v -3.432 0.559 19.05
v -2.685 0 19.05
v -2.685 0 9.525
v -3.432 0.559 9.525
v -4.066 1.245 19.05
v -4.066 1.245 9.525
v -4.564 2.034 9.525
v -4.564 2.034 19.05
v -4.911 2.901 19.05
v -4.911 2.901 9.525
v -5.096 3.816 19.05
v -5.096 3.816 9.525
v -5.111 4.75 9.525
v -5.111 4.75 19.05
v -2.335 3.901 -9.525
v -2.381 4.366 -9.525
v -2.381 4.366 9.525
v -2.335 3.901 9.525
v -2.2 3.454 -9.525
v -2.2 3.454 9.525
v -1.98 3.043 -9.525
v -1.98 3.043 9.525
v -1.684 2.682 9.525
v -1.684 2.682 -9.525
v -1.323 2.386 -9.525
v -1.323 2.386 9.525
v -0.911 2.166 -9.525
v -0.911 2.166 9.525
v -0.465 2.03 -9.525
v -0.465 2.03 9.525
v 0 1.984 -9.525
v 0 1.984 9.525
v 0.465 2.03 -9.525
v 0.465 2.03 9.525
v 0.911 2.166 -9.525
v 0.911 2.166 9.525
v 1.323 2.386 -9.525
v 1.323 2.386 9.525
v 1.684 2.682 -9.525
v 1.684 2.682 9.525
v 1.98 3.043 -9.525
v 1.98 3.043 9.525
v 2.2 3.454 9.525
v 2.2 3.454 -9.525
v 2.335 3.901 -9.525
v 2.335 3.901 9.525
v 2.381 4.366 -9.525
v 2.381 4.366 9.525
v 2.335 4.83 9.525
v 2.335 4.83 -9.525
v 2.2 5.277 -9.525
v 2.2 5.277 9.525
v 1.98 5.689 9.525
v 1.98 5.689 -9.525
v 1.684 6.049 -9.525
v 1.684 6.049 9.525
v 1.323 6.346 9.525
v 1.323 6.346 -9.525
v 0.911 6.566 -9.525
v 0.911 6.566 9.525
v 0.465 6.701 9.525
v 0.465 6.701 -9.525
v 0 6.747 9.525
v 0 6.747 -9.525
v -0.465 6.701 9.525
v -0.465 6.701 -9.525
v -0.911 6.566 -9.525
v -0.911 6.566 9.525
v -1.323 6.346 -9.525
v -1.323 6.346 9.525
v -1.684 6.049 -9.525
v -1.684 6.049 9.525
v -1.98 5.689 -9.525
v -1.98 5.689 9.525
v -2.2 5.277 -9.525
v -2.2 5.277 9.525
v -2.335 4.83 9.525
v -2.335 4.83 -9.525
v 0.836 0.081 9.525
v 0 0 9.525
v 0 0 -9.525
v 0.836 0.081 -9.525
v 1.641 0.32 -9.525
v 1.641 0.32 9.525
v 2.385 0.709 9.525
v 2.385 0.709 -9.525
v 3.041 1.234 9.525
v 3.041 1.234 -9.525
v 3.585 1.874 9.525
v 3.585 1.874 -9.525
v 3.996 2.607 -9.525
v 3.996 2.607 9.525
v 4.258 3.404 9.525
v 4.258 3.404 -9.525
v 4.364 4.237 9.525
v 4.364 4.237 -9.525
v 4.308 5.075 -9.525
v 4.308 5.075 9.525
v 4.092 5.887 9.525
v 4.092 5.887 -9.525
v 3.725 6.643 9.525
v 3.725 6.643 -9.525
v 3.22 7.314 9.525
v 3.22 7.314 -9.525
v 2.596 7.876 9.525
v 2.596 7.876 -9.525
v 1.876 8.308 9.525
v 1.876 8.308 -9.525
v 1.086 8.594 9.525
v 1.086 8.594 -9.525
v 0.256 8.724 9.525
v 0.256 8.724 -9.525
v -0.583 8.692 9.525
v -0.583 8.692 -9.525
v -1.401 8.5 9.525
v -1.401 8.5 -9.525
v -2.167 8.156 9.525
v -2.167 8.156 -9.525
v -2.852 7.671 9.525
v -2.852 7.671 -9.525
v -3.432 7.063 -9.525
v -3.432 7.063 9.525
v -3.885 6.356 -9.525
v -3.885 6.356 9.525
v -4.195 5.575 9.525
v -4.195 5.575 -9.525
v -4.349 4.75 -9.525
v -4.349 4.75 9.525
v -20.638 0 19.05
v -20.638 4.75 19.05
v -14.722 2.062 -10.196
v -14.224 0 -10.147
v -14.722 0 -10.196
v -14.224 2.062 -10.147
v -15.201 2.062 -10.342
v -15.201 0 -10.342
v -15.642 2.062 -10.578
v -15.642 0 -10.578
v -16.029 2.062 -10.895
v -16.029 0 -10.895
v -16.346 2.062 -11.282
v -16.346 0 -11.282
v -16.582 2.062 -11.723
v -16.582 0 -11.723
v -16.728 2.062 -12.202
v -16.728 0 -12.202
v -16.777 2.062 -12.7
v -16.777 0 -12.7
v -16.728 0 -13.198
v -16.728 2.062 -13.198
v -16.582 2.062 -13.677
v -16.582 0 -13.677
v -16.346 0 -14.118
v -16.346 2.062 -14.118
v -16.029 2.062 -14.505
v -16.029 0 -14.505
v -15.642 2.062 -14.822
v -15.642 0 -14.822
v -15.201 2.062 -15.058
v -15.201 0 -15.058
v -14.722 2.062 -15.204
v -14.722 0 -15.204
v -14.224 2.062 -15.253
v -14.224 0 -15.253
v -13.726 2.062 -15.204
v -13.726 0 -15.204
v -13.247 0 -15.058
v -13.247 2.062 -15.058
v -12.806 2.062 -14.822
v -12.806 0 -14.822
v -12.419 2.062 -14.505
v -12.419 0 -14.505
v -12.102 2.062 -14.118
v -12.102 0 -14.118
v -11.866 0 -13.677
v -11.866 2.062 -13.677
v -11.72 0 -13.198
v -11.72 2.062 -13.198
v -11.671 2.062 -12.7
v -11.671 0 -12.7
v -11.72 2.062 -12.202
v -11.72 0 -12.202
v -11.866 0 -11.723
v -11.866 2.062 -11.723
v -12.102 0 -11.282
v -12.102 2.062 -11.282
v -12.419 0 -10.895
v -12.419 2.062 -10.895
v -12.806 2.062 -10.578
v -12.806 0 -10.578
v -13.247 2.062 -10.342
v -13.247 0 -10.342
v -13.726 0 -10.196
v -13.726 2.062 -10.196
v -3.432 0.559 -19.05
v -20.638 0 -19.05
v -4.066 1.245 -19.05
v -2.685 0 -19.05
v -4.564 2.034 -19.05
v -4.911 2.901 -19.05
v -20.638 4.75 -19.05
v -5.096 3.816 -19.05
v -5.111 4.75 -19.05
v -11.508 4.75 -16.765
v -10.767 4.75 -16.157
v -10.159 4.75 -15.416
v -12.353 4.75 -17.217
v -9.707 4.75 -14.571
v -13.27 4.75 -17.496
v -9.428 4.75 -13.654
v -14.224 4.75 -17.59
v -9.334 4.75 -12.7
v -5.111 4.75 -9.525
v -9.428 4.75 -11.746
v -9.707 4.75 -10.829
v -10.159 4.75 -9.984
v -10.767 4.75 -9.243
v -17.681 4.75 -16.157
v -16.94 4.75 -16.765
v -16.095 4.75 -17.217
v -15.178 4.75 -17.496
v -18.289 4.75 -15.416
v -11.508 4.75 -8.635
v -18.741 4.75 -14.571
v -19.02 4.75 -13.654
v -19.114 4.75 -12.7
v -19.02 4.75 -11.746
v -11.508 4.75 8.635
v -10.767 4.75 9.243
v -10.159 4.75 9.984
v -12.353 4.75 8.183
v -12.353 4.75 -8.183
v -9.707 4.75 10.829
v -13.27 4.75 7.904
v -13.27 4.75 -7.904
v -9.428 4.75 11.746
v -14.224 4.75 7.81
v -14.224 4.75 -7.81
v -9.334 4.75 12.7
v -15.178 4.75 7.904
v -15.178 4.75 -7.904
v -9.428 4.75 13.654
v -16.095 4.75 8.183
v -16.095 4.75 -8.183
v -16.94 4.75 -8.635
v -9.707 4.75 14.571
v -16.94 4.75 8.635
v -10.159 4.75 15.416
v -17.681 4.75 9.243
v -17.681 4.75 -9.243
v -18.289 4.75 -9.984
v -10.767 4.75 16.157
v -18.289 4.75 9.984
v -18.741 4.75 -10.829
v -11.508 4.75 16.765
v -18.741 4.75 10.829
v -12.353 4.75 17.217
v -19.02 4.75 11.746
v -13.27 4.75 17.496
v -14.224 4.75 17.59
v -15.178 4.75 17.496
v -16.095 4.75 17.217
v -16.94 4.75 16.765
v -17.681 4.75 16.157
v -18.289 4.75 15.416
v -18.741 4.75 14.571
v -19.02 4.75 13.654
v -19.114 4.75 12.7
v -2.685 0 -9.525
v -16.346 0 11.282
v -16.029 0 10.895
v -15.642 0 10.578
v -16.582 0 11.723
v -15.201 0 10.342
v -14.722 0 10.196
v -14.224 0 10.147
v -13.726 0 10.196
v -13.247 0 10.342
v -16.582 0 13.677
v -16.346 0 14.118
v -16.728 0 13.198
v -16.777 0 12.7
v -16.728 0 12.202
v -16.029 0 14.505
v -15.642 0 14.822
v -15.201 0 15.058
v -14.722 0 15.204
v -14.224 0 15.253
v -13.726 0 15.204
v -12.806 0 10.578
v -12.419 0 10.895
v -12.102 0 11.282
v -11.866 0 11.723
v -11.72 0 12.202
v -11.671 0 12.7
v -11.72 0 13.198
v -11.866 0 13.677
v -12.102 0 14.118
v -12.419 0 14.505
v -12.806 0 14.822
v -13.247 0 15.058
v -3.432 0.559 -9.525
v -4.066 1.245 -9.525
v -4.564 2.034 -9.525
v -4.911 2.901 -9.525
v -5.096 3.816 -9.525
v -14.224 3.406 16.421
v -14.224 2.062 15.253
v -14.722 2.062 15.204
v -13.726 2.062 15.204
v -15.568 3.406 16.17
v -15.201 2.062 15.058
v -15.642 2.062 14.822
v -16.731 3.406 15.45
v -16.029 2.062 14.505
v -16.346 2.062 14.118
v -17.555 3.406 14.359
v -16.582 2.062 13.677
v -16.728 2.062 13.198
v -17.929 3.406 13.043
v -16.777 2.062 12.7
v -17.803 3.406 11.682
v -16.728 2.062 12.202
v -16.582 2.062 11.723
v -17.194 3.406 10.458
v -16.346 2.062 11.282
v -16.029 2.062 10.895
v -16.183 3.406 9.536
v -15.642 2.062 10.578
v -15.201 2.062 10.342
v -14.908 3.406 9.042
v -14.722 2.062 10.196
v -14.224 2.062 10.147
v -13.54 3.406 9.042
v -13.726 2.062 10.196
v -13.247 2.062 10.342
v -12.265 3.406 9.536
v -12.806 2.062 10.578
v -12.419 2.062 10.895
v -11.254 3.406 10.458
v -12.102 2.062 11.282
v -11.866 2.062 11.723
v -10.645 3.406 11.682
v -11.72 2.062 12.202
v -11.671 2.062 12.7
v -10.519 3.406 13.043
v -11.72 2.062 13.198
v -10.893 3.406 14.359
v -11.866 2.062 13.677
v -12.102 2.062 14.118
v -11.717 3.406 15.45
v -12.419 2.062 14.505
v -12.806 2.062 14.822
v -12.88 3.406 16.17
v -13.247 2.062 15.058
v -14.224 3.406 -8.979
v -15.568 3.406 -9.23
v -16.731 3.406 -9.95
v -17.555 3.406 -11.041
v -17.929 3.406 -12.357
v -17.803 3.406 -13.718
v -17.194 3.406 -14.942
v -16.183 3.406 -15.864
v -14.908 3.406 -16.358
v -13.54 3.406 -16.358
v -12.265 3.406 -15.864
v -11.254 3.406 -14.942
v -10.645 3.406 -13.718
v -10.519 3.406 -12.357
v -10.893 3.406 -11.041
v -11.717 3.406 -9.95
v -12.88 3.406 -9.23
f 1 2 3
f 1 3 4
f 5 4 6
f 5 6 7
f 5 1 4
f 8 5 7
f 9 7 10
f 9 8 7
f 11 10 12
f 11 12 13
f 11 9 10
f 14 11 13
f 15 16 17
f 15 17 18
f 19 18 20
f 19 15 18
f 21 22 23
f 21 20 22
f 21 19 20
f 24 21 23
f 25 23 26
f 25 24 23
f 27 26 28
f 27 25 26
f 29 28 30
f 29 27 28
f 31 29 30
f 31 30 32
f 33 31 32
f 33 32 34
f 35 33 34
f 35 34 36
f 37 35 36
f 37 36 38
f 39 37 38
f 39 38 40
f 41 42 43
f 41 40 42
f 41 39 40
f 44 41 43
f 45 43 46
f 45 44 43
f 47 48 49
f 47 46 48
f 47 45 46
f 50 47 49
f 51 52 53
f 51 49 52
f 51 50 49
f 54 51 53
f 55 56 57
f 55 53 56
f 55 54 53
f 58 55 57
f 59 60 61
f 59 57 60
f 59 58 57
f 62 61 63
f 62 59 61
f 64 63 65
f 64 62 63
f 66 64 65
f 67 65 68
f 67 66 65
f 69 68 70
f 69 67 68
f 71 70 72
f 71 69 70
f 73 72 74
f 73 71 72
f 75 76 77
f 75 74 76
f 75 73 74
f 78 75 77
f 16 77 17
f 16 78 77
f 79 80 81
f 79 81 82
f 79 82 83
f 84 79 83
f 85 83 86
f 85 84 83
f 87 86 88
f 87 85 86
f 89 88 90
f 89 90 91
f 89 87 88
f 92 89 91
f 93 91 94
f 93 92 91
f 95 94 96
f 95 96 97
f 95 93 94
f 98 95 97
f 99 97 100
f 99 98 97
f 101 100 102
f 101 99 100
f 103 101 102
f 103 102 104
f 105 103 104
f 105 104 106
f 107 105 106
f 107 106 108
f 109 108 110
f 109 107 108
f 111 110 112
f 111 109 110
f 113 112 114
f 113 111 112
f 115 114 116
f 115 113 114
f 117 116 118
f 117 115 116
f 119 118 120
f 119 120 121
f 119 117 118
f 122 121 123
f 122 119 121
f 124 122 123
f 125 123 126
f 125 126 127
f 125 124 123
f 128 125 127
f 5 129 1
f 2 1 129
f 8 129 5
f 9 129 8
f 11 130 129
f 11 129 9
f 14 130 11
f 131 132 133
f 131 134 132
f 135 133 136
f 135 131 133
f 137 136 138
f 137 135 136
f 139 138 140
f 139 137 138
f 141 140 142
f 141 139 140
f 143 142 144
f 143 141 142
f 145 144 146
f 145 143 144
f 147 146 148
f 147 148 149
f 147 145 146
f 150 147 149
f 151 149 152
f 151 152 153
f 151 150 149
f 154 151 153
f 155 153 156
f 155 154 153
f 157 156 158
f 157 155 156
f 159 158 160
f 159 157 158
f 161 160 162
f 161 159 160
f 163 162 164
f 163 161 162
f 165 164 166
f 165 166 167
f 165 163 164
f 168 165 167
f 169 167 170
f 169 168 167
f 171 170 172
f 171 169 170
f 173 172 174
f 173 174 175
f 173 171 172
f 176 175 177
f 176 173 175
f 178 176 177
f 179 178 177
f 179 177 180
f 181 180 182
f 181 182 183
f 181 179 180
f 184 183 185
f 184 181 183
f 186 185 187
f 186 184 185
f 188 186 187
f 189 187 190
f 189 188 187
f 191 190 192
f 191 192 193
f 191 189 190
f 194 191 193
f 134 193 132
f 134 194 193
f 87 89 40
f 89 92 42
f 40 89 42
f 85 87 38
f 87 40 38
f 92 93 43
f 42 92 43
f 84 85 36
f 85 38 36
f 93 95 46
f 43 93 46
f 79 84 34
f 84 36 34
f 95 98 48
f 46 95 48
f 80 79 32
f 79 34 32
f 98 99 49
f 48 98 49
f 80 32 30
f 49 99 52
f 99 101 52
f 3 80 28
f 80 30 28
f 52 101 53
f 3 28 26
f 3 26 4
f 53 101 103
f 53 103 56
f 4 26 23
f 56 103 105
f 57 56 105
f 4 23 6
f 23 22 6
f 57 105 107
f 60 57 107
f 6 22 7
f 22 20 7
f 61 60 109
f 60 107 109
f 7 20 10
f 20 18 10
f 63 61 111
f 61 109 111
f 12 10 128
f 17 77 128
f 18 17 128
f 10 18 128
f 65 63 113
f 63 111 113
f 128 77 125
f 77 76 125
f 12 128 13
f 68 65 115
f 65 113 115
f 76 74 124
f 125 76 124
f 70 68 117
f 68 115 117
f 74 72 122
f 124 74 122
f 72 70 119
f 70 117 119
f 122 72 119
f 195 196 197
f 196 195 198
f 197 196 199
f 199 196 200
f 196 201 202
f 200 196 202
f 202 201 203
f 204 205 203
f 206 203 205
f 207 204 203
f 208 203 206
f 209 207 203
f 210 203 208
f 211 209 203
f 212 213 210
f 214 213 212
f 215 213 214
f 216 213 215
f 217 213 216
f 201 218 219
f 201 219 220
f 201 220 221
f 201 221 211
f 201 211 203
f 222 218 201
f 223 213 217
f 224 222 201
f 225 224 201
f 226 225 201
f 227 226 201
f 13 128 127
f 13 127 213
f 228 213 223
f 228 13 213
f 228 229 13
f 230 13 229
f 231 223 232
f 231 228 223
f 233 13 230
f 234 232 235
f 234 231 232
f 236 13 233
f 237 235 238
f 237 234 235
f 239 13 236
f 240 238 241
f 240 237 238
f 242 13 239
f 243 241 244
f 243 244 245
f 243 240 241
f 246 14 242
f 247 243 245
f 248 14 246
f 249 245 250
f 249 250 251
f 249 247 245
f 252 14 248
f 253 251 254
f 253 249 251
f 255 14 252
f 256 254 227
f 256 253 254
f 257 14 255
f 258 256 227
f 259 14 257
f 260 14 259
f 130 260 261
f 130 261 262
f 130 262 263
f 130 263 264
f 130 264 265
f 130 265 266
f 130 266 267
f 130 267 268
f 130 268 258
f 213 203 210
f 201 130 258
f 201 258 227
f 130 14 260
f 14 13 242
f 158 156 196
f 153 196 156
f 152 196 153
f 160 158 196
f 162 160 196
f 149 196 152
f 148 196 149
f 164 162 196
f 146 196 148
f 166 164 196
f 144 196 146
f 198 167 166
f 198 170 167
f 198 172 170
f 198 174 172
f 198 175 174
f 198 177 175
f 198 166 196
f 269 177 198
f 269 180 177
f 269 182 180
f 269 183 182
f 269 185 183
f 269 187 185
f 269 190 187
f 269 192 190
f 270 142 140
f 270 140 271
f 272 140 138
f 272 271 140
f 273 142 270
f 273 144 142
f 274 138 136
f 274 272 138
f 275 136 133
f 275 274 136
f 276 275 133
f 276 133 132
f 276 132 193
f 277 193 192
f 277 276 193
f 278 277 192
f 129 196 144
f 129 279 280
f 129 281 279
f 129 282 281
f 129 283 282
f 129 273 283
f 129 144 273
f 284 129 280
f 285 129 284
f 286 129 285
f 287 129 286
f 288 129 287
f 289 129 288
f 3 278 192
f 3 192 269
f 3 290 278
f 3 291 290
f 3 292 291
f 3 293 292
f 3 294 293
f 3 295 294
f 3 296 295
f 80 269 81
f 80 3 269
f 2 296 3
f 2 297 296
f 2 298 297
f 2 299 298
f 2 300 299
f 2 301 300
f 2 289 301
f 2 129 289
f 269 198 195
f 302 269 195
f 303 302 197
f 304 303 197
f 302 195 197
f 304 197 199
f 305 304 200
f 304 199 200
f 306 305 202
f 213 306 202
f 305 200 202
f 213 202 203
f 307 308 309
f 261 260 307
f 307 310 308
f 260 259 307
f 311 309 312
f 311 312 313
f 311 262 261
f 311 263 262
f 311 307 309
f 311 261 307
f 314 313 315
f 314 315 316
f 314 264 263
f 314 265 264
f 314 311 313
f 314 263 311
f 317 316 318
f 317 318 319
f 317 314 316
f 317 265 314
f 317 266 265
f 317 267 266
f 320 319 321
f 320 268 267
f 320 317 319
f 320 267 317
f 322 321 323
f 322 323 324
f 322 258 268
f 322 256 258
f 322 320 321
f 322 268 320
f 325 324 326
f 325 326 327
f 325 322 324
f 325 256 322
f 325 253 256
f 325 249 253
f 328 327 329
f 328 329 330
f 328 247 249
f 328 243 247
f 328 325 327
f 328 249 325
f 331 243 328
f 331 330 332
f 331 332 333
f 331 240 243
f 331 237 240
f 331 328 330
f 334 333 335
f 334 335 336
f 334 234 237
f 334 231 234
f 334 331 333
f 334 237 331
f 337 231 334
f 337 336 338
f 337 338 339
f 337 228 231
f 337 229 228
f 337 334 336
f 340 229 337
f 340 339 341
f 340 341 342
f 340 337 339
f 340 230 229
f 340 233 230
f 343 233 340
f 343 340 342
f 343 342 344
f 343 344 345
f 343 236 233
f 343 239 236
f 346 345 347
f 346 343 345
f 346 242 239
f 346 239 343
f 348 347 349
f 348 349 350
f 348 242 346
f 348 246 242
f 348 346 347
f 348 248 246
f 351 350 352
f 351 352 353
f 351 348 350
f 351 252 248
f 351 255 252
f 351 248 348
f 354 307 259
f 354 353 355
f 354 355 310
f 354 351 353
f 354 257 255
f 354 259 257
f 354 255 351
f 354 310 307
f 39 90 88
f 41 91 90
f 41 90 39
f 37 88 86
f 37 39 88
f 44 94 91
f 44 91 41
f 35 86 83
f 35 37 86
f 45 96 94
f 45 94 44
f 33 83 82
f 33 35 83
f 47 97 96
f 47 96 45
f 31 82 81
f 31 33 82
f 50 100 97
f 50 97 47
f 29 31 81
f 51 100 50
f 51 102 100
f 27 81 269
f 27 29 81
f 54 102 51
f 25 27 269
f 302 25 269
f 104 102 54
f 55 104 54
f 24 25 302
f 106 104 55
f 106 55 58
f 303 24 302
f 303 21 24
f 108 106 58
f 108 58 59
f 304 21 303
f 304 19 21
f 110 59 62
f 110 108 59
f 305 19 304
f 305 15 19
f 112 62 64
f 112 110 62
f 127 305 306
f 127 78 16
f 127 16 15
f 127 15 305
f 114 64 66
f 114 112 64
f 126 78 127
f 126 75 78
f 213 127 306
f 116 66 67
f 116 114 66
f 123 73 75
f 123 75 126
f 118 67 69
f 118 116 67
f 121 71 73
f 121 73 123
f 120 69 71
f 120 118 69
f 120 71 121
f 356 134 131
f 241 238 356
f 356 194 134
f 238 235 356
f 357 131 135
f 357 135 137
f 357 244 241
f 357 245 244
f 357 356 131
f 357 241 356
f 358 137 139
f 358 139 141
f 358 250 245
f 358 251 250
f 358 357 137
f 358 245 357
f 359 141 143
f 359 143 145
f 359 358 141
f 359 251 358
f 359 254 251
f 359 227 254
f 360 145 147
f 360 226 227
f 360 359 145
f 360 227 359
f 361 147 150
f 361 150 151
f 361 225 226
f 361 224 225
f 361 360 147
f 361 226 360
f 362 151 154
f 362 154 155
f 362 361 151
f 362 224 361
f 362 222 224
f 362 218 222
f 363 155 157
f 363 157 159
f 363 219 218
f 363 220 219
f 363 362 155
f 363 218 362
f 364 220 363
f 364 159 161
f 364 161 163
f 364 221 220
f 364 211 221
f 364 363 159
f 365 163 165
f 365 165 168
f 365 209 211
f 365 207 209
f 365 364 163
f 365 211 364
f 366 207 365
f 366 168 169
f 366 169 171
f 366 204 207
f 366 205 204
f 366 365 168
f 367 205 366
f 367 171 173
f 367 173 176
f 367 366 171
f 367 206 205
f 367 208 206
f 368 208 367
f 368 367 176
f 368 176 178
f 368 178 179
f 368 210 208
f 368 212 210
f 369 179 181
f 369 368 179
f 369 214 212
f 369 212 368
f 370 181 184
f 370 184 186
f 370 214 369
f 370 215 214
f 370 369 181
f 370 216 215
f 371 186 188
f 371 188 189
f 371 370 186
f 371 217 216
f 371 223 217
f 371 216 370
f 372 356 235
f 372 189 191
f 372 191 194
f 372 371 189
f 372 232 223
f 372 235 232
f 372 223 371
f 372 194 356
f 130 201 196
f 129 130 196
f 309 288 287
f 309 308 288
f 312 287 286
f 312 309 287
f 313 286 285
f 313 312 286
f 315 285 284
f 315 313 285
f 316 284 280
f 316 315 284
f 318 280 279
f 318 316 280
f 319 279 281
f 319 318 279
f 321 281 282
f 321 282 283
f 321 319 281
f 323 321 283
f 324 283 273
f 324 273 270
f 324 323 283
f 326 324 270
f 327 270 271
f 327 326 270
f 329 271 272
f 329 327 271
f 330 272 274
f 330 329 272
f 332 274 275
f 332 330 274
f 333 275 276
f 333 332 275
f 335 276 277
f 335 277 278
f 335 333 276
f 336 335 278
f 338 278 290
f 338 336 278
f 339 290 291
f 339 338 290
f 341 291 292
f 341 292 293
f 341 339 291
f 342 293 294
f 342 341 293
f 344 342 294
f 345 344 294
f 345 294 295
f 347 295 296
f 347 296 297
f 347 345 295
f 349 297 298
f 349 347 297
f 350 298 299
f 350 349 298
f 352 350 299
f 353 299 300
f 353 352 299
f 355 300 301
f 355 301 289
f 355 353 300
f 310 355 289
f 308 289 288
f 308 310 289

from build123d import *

# Parameters (mm, degrees)
SKETCH1_R                                    = 2.38125
EXTRUDE1_DEPTH                               = 19.05
CUT_EXTRUDE1_DEPTH                           = 9.525
CSK_FOR_10_FLAT_HEAD_MACHINE_SCREW1_AT_COUNT = 2
CSK_FOR_10_FLAT_HEAD_MACHINE_SCREW1_AT_PITCH = 25.4


with BuildPart() as part:
    # Sketch1 → Extrude1 (new, symmetric)
    with BuildSketch(Plane.XY):
        with BuildLine():
            Line((-20.6375, 0), (0, 0))
            ThreePointArc((0, 0), (3.219925902, 1.417615701), (4.348688447, 4.7498))
            ThreePointArc((4.348688447, 4.7498), (0, 8.73125), (-4.348688447, 4.7498))
            Line((-4.348688447, 4.7498), (-20.6375, 4.7498))
            Line((-20.6375, 4.7498), (-20.6375, 0))
        make_face()
        with Locations(Location((0, 4.365625, 0), (0, 0, 180))):
            Circle(SKETCH1_R, mode=Mode.SUBTRACT)
    extrude(amount=EXTRUDE1_DEPTH, both=True)

    # Sketch2 → Cut-Extrude1 (cut)
    with BuildSketch(Plane.XY.offset(19.05)):
        with BuildLine():
            Line((-5.110688447, 4.7498), (-4.348688447, 4.7498))
            ThreePointArc((-4.348688447, 4.7498), (3.936533663, 7.969725902), (0, 0))
            Line((0, 0), (-2.684780288, 0))
            ThreePointArc((-2.684780288, 0), (-4.564261518, 2.034478581), (-5.110688447, 4.7498))
        make_face()
    cut_extrude1 = extrude(amount=-CUT_EXTRUDE1_DEPTH, mode=Mode.SUBTRACT)

    # Mirror1: Cut-Extrude1 across plane
    add(cut_extrude1.mirror(Plane.XY), mode=Mode.SUBTRACT)

    # Sketch6 → CSK for #10 Flat Head Machine Screw1 (revolve, cut)
    with BuildSketch(Plane(origin=(-14.224, 4.7498, -12.7), x_dir=(0, 0, 1), z_dir=(1, 0, 0))):
        Polygon((0, 0), (0, 4.7498), (2.5527, 4.7498), (2.5527, 2.688180894), (4.8895, 0), align=None)
    csk_for_10_flat_head_machine_screw1 = revolve(axis=Axis((-14.224, 11.0998, -12.7), (0, -1, 0)), mode=Mode.SUBTRACT)

    # CSK for #10 Flat Head Machine Screw1 at: CSK for #10 Flat Head Machine Screw1 ×2
    with Locations(*[(0, 0, i * CSK_FOR_10_FLAT_HEAD_MACHINE_SCREW1_AT_PITCH) for i in range(1, CSK_FOR_10_FLAT_HEAD_MACHINE_SCREW1_AT_COUNT)]):
        add(csk_for_10_flat_head_machine_screw1, mode=Mode.SUBTRACT)


solid = part.part
